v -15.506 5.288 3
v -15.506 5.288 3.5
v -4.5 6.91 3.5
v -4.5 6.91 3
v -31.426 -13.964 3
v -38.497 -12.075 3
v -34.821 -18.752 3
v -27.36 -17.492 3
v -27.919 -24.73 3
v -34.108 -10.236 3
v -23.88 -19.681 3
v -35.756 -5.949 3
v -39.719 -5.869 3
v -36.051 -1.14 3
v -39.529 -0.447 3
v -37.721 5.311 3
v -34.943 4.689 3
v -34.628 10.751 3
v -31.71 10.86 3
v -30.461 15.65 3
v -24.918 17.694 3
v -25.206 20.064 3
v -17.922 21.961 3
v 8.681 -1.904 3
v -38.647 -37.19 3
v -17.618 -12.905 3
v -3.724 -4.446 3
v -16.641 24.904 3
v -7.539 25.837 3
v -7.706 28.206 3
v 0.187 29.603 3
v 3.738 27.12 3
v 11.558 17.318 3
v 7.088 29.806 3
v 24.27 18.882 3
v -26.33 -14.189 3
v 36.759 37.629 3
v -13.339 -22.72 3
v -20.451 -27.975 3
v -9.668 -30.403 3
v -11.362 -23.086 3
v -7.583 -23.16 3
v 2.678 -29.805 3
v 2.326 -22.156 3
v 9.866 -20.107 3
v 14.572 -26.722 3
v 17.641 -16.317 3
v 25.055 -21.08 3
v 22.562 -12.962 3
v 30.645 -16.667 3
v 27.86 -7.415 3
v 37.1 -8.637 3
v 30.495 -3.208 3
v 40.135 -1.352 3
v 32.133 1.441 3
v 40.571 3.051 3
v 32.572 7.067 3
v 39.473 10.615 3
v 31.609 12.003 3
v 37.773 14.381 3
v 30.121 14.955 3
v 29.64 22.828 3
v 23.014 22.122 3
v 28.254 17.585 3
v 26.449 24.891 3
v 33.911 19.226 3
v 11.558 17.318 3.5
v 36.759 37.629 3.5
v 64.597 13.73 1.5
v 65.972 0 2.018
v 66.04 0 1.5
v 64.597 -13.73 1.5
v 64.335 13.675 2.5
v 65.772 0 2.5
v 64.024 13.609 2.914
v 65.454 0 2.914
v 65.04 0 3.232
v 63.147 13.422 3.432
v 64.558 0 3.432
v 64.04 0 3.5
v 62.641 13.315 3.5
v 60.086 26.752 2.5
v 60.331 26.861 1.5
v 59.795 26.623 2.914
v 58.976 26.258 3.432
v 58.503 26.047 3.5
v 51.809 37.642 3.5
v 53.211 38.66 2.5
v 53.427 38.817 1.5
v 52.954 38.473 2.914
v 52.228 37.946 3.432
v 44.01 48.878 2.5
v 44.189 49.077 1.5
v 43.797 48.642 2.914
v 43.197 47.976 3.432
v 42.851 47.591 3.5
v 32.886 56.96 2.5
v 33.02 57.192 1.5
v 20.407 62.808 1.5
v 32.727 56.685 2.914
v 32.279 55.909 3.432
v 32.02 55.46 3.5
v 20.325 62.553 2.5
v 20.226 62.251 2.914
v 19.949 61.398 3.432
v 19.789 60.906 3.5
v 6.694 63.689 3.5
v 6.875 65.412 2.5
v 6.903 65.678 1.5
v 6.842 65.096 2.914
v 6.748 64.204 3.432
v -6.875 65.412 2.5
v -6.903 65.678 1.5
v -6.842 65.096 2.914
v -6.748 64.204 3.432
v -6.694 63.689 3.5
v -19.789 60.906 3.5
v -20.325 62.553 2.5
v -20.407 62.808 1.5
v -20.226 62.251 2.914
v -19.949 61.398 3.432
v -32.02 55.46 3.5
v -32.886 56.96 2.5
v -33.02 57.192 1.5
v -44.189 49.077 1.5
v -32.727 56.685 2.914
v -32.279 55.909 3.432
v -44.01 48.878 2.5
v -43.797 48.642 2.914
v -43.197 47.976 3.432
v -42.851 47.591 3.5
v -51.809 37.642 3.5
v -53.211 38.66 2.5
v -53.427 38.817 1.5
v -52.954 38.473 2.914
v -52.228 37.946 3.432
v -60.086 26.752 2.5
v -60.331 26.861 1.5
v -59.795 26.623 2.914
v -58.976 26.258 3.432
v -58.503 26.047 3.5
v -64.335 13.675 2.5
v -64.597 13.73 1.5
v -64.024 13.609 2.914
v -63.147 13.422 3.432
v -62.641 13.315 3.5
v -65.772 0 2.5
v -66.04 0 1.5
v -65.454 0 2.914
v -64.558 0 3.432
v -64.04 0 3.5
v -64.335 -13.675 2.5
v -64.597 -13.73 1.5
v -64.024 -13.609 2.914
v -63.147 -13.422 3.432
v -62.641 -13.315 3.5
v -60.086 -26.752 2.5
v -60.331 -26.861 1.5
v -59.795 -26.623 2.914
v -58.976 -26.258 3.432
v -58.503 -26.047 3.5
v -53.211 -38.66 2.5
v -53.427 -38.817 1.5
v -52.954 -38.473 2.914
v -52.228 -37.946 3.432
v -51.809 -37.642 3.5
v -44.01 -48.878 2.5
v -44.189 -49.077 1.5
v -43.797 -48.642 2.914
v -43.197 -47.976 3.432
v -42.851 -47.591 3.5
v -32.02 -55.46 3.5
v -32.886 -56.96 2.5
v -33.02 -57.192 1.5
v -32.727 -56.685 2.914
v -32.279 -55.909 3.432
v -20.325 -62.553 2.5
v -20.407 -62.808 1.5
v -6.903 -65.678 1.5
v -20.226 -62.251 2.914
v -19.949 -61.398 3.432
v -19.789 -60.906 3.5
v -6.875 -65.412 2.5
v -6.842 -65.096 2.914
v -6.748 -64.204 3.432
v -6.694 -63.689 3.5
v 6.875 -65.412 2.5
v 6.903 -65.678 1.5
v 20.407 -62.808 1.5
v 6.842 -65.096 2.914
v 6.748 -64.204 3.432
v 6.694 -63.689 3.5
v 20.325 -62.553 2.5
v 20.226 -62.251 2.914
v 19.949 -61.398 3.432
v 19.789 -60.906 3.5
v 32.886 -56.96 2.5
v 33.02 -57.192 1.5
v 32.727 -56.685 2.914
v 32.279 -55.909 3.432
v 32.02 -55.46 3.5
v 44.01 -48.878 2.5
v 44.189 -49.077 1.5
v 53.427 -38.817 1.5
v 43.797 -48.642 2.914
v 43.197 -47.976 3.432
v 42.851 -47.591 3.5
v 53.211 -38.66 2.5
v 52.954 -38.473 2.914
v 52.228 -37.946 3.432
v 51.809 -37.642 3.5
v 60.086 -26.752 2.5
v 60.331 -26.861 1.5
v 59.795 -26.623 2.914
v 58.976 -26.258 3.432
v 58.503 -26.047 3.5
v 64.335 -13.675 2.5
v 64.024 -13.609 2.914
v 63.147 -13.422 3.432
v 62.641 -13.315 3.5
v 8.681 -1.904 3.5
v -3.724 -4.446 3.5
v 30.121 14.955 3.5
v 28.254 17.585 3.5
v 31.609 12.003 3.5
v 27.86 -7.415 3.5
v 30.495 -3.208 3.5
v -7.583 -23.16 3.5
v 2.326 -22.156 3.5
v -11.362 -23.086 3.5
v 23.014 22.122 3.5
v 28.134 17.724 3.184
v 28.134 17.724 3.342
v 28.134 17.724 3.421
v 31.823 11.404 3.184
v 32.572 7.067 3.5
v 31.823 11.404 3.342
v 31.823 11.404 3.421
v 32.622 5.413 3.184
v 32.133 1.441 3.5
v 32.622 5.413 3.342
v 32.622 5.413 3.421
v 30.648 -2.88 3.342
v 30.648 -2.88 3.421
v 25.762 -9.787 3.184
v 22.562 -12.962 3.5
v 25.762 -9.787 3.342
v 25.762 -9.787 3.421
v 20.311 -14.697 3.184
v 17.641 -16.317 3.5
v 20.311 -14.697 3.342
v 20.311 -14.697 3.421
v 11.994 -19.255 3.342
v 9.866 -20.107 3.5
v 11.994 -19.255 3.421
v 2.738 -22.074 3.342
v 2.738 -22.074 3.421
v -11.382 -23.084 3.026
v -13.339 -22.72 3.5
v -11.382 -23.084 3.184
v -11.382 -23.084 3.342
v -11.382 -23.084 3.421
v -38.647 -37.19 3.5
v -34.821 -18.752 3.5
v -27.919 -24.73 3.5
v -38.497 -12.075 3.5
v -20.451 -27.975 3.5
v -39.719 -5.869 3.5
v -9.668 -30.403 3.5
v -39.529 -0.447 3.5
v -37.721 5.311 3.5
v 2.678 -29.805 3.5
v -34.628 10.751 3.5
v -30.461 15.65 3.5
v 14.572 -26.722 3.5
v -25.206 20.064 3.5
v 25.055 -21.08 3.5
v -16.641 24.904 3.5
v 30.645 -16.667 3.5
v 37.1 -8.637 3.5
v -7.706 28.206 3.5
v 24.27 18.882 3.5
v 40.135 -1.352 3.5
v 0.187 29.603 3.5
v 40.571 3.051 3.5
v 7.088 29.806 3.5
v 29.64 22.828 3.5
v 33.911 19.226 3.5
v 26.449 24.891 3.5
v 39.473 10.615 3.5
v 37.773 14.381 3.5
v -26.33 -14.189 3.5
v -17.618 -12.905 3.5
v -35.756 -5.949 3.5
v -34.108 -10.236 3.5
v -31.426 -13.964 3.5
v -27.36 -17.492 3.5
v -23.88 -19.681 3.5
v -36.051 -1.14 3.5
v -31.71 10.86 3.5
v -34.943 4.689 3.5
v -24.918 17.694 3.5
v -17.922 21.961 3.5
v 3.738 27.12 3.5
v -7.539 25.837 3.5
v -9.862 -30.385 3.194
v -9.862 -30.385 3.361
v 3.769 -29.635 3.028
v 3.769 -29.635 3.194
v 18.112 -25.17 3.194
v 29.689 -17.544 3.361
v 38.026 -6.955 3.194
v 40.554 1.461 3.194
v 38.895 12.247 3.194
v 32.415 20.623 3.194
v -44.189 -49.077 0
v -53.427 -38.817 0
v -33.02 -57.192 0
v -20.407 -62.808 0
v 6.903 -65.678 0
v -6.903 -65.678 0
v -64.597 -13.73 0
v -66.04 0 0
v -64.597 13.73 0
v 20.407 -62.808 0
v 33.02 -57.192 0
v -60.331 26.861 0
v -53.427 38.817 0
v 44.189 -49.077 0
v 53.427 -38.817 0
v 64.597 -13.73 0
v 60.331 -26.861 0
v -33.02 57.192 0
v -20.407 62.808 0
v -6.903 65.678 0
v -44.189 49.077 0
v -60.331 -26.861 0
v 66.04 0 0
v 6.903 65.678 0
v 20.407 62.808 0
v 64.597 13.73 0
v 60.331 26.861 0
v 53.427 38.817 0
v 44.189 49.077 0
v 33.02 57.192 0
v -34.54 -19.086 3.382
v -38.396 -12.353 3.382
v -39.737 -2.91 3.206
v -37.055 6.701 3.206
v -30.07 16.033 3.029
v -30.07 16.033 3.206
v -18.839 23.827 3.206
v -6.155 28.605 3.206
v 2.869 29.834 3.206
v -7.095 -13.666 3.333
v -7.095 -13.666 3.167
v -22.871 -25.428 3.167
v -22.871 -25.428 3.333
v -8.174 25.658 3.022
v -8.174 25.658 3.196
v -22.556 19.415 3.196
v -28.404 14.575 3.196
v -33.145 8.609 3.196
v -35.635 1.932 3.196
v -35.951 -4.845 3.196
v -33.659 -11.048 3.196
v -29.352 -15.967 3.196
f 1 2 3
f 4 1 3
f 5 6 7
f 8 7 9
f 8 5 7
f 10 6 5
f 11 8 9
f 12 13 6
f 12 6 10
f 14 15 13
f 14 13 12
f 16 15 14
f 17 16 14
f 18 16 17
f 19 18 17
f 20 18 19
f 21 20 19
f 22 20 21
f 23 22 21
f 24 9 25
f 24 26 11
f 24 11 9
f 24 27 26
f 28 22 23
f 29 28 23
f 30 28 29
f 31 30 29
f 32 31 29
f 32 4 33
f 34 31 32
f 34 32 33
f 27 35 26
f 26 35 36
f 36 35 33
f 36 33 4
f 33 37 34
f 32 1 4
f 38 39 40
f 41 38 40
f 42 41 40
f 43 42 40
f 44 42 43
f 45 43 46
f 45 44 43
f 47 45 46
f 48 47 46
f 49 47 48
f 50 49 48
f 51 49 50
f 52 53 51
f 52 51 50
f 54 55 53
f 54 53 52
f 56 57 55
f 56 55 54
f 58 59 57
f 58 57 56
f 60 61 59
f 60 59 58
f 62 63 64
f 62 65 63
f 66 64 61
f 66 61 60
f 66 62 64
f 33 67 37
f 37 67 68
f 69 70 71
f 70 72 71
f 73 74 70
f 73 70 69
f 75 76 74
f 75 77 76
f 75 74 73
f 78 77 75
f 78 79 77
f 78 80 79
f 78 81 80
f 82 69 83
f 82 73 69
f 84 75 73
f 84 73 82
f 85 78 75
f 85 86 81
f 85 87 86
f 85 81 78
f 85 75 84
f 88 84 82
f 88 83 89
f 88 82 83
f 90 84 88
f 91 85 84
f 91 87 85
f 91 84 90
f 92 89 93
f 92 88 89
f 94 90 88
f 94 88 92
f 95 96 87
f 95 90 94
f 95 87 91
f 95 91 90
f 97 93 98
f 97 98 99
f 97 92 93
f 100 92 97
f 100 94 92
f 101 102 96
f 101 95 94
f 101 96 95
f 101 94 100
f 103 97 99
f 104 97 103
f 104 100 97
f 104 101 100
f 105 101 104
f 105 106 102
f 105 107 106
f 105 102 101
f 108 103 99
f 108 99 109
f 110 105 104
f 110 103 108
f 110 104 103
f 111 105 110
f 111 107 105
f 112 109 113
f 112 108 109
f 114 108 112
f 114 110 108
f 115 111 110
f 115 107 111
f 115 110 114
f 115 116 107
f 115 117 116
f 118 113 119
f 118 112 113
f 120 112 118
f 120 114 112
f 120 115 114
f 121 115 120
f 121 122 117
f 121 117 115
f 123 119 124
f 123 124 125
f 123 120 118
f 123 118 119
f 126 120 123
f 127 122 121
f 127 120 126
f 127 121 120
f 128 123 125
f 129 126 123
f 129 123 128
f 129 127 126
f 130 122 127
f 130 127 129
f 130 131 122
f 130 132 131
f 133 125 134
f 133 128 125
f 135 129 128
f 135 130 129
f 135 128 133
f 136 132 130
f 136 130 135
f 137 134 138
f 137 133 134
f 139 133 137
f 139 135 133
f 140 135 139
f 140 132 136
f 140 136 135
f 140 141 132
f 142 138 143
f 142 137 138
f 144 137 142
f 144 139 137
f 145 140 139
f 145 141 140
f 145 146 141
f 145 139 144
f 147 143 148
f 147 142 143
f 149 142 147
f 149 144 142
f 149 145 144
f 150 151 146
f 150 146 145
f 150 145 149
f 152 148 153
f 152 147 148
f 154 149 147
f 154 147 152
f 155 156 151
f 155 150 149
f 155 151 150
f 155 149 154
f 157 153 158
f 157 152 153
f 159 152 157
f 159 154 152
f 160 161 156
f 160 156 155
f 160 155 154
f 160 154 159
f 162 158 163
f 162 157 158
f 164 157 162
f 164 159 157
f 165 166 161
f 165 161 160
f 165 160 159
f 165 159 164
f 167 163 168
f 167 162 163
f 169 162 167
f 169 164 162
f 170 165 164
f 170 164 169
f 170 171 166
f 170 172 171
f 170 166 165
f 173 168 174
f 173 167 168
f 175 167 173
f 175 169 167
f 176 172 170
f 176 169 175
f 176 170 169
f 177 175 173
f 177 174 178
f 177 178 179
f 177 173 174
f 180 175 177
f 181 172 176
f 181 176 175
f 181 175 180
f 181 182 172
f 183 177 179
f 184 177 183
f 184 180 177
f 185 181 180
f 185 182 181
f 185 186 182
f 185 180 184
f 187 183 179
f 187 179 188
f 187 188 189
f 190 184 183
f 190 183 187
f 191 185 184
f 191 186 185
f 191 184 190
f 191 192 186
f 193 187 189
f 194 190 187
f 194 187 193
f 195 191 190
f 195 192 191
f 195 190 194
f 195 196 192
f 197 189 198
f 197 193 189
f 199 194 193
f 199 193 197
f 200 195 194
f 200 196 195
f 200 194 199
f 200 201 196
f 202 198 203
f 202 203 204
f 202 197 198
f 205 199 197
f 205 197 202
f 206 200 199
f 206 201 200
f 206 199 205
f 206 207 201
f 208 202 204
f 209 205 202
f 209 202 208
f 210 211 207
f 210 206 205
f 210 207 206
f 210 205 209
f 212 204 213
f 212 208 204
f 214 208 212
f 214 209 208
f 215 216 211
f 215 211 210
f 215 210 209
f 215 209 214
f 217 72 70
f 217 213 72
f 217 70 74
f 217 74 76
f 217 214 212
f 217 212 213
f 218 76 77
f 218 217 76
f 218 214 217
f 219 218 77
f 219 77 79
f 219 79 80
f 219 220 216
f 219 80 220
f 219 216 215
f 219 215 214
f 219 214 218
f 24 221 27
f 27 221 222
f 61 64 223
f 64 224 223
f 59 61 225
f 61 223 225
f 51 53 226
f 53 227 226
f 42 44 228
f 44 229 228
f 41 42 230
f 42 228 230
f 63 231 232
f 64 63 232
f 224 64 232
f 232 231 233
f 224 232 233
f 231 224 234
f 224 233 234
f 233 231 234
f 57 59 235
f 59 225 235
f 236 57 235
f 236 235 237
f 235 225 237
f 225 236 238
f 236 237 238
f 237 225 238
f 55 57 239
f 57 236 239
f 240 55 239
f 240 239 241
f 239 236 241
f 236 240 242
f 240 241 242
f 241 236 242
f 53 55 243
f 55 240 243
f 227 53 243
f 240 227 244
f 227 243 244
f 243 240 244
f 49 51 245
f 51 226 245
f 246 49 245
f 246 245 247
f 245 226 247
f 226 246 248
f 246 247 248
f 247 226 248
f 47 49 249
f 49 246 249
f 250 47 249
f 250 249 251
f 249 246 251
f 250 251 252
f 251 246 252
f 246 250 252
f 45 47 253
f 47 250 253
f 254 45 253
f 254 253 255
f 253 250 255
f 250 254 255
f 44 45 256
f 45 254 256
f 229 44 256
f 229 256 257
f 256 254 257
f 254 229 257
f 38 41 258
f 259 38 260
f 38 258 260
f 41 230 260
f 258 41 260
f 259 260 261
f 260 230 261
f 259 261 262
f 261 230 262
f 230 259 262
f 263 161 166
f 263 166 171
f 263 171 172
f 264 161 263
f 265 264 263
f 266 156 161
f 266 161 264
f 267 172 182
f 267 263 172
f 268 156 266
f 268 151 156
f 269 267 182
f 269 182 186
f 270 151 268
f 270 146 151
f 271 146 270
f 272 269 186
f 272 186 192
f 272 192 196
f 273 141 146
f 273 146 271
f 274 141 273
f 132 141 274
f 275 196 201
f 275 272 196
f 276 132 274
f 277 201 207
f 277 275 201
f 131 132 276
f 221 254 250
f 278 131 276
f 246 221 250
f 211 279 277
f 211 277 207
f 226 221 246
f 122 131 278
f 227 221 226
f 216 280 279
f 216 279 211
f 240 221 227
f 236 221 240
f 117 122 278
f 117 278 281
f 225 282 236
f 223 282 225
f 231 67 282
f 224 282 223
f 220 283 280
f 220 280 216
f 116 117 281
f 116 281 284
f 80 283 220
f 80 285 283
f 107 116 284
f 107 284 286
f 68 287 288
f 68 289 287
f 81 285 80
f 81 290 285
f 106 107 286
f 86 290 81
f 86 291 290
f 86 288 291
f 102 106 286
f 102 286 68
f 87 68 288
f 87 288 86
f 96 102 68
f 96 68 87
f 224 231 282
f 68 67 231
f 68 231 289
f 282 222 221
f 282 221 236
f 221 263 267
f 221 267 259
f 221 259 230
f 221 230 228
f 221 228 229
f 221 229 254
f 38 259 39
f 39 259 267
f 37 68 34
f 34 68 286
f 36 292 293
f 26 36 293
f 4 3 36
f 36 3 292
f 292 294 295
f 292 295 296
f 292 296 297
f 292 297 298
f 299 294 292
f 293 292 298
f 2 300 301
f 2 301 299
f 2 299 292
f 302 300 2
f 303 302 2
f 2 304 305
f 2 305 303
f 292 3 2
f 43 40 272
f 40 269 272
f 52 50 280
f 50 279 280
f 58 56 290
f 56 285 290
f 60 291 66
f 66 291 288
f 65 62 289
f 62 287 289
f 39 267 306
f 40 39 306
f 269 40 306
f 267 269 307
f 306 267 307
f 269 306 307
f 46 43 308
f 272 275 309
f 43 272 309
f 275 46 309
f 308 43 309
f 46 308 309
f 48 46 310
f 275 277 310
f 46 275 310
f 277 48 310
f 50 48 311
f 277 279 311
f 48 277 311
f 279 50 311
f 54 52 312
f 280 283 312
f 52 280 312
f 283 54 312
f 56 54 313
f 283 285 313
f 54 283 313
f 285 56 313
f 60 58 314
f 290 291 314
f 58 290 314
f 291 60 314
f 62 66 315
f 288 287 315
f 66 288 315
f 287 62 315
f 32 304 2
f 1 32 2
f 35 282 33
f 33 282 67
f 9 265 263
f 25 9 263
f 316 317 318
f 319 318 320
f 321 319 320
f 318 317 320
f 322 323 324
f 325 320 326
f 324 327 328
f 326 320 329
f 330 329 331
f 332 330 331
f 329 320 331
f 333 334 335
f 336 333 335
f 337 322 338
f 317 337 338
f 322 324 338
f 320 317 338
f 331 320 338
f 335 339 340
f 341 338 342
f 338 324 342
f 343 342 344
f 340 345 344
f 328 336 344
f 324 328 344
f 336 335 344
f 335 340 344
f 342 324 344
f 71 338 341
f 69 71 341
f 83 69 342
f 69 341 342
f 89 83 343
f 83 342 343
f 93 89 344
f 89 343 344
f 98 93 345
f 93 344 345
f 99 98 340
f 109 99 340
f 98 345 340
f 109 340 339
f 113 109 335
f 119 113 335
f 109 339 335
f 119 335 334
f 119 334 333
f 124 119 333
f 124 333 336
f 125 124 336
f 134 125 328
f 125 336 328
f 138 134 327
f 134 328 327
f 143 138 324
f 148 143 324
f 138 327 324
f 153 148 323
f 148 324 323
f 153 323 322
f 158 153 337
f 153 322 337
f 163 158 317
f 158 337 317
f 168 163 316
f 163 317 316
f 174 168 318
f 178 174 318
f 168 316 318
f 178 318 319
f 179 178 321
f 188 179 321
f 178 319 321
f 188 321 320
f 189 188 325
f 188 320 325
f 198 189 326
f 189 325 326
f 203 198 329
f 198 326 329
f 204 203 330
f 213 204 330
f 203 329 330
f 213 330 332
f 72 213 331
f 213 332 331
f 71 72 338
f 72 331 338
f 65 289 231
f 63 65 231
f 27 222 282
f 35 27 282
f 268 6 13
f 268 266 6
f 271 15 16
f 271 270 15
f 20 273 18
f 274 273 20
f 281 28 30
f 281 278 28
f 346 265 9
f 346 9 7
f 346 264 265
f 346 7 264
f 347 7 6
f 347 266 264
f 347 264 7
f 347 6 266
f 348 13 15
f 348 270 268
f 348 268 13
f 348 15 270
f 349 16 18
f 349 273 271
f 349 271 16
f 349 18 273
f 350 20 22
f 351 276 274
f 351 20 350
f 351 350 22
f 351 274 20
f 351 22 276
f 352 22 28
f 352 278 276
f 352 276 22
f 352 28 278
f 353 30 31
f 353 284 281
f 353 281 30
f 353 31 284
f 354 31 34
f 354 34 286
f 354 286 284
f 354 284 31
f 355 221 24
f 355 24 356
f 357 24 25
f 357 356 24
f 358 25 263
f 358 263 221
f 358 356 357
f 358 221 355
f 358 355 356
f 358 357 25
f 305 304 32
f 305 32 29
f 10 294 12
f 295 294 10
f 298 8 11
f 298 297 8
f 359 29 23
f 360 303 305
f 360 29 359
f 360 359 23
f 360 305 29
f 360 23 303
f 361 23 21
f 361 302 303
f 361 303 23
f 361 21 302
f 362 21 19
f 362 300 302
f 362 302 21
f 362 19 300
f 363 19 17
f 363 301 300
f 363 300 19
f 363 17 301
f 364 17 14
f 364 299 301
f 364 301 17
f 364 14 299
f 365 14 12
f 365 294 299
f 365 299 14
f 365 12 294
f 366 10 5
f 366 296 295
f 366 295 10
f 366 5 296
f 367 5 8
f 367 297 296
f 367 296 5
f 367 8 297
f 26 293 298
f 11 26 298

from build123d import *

# Parameters (mm, degrees)
F0_R     = 66.04
F1_DEPTH = 3.5
F3_DEPTH = 0.5
F4_R     = 2


with BuildPart() as f1:
    # F0 (on Top) → F1 (new body)
    with BuildSketch(Plane.XY):
        Circle(F0_R)
    extrude(amount=F1_DEPTH)

    # F2 (on face) → F3 (cut)
    with BuildSketch(Plane.XY.offset(3.5)):
        with BuildLine():
            Line((36.7589145899, 37.629019469), (7.088160608, 29.8062227666))
            add(Edge.make_bspline(
                [(-27.9188621789, -24.7298497707), (-28.6586928586, -24.2103901464), (-30.4148624686, -22.977325297), (-34.7839086401, -19.2292372163), (-36.7492639554, -15.8301967621), (-38.5813905625, -12.392258781), (-39.75259532, -7.49957565), (-39.8114737138, -2.8913390892), (-39.4153051917, 1.3872774793), (-37.155174617, 6.8463574778), (-34.2487020488, 11.5543521179), (-30.1449211522, 16.1966267345), (-24.8865606472, 20.5465305085), (-18.820652323, 23.9222079865), (-13.5893033373, 26.3447324713), (-6.2676210393, 28.8086948244), (-0.9973036761, 29.4594702935), (2.8494568659, 29.9332388479), (5.6501959782, 29.8493125043), (7.088160608, 29.8062227666)],
                knots=[0, 0, 0, 0, 0.0451249272, 0.1071150846, 0.1588573068, 0.2095718144, 0.267664136, 0.3232882023, 0.3768767861, 0.4394121671, 0.5007893365, 0.5650325207, 0.6332195526, 0.7010771123, 0.7641179487, 0.8361406793, 0.8960766014, 0.946643309, 1, 1, 1, 1], degree=3))
            Line((-27.9188621789, -24.7298497707), (-38.6472716928, -37.1904484928))
            add(Edge.make_bspline(
                [(8.680658415, -1.9040451152), (-7.0953182876, -13.6661795744), (-22.8712949902, -25.4283140336), (-38.6472716928, -37.1904484928)],
                knots=[0, 0, 0, 0, 59.0344241236, 59.0344241236, 59.0344241236, 59.0344241236], degree=3))
            Line((8.680658415, -1.9040451152), (-3.7240635138, -4.4464543462))
            Line((-3.7240635138, -4.4464543462), (24.2703761905, 18.8822448254))
            Line((24.2703761905, 18.8822448254), (11.5583296865, 17.3176843673))
            Line((11.5583296865, 17.3176843673), (36.7589145899, 37.629019469))
        make_face()
        with BuildLine():
            add(Edge.make_bspline(
                [(3.7381993607, 27.1198898554), (2.971135623, 27.1618474152), (1.2947530215, 27.2535437369), (-1.9863245634, 26.752964039), (-5.5830102518, 26.3936384961), (-8.1626603235, 25.6625858195), (-11.8819068257, 24.5992540716), (-15.194299707, 23.2915717189), (-18.3387248736, 21.7834257182), (-22.657889275, 19.4908286459), (-25.3334584396, 17.405984417), (-28.4560760539, 14.5877478565), (-31.1520888031, 11.8106881463), (-33.1981293641, 8.6361921113), (-34.8489244867, 5.4336172817), (-35.6717957614, 1.8976307489), (-36.1212606559, -0.7356813567), (-36.1055273874, -4.9327401117), (-35.284250801, -7.7228924909), (-33.7690554357, -11.151243353), (-31.7825018341, -13.6634363898), (-29.4483207392, -15.9985267381), (-27.0119624763, -17.7648035422), (-25.4106160526, -18.7590652994), (-24.3846229373, -19.3770721413), (-23.8800570369, -19.6809973568)],
                knots=[0, 0, 0, 0, 0.0370080786, 0.0808794576, 0.1262134195, 0.1655943936, 0.2123656254, 0.2575173754, 0.3025728065, 0.3550686508, 0.3996737986, 0.4482930207, 0.4956445603, 0.5418786203, 0.587545708, 0.6324346113, 0.6721602243, 0.720331977, 0.7617849857, 0.8074577834, 0.8504872685, 0.8941300827, 0.9355240772, 0.9682918418, 1, 1, 1, 1], degree=3))
            Line((3.7381993607, 27.1198898554), (-15.5056634386, 5.2878007289))
            Line((-15.5056634386, 5.2878007289), (-4.4998652302, 6.9099701941))
            Line((-4.4998652302, 6.9099701941), (-26.3297446072, -14.188955538))
            Line((-26.3297446072, -14.188955538), (-17.6175478846, -12.9048451781))
            Line((-17.6175478846, -12.9048451781), (-23.8800570369, -19.6809973568))
        make_face(mode=Mode.SUBTRACT)
        with BuildLine():
            add(Edge.make_bspline(
                [(23.0140855235, 22.1223023413), (23.6337480093, 21.7049911427), (25.0817865454, 20.7298107649), (28.3144677633, 17.8145217038), (30.5631850073, 14.3623327366), (31.9299956157, 11.4542653938), (32.4038757117, 8.878719599), (32.7918336503, 5.3554549599), (32.1630546429, 0.8710537681), (30.7342580485, -2.9112662617), (28.7888202269, -6.4806965762), (25.7872064292, -9.7882796528), (23.0901008337, -12.5984417239), (20.3259832239, -14.8008398541), (16.8563718909, -16.7655352132), (12.083012982, -19.4120821964), (6.6545909805, -21.2312151302), (2.6297224287, -22.1259203281), (-2.7686651604, -23.1002452156), (-11.2544630445, -23.2923264004), (-12.8249440359, -22.861325742), (-13.338916935, -22.7202717215)],
                knots=[0, 0, 0, 0, 0.0405040979, 0.0946507106, 0.1480773568, 0.1940198869, 0.2355227836, 0.2842322816, 0.3395597185, 0.3918333536, 0.4440264689, 0.4989766927, 0.5503408725, 0.5986057845, 0.650215388, 0.7114530865, 0.7735610236, 0.8254499534, 0.8879083382, 0.9633156487, 1, 1, 1, 1], degree=3))
            Line((-13.338916935, -22.7202717215), (-20.4509142786, -27.9752481729))
            add(Edge.make_bspline(
                [(-20.4509142786, -27.9752481729), (-18.8172337543, -28.4739563845), (-15.4699105031, -29.4957826029), (-9.8113094816, -30.5934467075), (-3.4476646051, -30.5276095836), (3.8323637699, -29.7792821906), (10.9948418748, -28.1270192234), (18.1616670883, -25.4269070755), (24.9613540992, -21.2618874253), (29.7707603508, -17.7083655535), (34.6400151481, -12.6535211177), (38.1350855825, -7.1300397484), (39.906954757, -2.6337329233), (40.7854535947, 1.4807883485), (40.3205082437, 6.8263907972), (39.2885733015, 12.3641756391), (35.9753768895, 17.0850121131), (32.6981331654, 20.6047877337), (28.1143591936, 23.9871411799), (26.8914743312, 24.6504593747), (26.4487545937, 24.8905997723)],
                knots=[0, 0, 0, 0, 0.0528863325, 0.1083612418, 0.1669825339, 0.2298350138, 0.2928105097, 0.3573840476, 0.4226321743, 0.4795914908, 0.5409064156, 0.6005080495, 0.6510696648, 0.6981285603, 0.7516560544, 0.8069216428, 0.8617149771, 0.914131578, 0.9689131443, 1, 1, 1, 1], degree=3))
            Line((26.4487545937, 24.8905997723), (23.0140855235, 22.1223023413))
        make_face()
    extrude(amount=-F3_DEPTH, mode=Mode.SUBTRACT)

    # F4
    f4_edges = [f1.edges().sort_by_distance(p)[0] for p in [
        (-66.04, 0, 3.5),
    ]]
    fillet(f4_edges, radius=F4_R)


solid = f1.part
